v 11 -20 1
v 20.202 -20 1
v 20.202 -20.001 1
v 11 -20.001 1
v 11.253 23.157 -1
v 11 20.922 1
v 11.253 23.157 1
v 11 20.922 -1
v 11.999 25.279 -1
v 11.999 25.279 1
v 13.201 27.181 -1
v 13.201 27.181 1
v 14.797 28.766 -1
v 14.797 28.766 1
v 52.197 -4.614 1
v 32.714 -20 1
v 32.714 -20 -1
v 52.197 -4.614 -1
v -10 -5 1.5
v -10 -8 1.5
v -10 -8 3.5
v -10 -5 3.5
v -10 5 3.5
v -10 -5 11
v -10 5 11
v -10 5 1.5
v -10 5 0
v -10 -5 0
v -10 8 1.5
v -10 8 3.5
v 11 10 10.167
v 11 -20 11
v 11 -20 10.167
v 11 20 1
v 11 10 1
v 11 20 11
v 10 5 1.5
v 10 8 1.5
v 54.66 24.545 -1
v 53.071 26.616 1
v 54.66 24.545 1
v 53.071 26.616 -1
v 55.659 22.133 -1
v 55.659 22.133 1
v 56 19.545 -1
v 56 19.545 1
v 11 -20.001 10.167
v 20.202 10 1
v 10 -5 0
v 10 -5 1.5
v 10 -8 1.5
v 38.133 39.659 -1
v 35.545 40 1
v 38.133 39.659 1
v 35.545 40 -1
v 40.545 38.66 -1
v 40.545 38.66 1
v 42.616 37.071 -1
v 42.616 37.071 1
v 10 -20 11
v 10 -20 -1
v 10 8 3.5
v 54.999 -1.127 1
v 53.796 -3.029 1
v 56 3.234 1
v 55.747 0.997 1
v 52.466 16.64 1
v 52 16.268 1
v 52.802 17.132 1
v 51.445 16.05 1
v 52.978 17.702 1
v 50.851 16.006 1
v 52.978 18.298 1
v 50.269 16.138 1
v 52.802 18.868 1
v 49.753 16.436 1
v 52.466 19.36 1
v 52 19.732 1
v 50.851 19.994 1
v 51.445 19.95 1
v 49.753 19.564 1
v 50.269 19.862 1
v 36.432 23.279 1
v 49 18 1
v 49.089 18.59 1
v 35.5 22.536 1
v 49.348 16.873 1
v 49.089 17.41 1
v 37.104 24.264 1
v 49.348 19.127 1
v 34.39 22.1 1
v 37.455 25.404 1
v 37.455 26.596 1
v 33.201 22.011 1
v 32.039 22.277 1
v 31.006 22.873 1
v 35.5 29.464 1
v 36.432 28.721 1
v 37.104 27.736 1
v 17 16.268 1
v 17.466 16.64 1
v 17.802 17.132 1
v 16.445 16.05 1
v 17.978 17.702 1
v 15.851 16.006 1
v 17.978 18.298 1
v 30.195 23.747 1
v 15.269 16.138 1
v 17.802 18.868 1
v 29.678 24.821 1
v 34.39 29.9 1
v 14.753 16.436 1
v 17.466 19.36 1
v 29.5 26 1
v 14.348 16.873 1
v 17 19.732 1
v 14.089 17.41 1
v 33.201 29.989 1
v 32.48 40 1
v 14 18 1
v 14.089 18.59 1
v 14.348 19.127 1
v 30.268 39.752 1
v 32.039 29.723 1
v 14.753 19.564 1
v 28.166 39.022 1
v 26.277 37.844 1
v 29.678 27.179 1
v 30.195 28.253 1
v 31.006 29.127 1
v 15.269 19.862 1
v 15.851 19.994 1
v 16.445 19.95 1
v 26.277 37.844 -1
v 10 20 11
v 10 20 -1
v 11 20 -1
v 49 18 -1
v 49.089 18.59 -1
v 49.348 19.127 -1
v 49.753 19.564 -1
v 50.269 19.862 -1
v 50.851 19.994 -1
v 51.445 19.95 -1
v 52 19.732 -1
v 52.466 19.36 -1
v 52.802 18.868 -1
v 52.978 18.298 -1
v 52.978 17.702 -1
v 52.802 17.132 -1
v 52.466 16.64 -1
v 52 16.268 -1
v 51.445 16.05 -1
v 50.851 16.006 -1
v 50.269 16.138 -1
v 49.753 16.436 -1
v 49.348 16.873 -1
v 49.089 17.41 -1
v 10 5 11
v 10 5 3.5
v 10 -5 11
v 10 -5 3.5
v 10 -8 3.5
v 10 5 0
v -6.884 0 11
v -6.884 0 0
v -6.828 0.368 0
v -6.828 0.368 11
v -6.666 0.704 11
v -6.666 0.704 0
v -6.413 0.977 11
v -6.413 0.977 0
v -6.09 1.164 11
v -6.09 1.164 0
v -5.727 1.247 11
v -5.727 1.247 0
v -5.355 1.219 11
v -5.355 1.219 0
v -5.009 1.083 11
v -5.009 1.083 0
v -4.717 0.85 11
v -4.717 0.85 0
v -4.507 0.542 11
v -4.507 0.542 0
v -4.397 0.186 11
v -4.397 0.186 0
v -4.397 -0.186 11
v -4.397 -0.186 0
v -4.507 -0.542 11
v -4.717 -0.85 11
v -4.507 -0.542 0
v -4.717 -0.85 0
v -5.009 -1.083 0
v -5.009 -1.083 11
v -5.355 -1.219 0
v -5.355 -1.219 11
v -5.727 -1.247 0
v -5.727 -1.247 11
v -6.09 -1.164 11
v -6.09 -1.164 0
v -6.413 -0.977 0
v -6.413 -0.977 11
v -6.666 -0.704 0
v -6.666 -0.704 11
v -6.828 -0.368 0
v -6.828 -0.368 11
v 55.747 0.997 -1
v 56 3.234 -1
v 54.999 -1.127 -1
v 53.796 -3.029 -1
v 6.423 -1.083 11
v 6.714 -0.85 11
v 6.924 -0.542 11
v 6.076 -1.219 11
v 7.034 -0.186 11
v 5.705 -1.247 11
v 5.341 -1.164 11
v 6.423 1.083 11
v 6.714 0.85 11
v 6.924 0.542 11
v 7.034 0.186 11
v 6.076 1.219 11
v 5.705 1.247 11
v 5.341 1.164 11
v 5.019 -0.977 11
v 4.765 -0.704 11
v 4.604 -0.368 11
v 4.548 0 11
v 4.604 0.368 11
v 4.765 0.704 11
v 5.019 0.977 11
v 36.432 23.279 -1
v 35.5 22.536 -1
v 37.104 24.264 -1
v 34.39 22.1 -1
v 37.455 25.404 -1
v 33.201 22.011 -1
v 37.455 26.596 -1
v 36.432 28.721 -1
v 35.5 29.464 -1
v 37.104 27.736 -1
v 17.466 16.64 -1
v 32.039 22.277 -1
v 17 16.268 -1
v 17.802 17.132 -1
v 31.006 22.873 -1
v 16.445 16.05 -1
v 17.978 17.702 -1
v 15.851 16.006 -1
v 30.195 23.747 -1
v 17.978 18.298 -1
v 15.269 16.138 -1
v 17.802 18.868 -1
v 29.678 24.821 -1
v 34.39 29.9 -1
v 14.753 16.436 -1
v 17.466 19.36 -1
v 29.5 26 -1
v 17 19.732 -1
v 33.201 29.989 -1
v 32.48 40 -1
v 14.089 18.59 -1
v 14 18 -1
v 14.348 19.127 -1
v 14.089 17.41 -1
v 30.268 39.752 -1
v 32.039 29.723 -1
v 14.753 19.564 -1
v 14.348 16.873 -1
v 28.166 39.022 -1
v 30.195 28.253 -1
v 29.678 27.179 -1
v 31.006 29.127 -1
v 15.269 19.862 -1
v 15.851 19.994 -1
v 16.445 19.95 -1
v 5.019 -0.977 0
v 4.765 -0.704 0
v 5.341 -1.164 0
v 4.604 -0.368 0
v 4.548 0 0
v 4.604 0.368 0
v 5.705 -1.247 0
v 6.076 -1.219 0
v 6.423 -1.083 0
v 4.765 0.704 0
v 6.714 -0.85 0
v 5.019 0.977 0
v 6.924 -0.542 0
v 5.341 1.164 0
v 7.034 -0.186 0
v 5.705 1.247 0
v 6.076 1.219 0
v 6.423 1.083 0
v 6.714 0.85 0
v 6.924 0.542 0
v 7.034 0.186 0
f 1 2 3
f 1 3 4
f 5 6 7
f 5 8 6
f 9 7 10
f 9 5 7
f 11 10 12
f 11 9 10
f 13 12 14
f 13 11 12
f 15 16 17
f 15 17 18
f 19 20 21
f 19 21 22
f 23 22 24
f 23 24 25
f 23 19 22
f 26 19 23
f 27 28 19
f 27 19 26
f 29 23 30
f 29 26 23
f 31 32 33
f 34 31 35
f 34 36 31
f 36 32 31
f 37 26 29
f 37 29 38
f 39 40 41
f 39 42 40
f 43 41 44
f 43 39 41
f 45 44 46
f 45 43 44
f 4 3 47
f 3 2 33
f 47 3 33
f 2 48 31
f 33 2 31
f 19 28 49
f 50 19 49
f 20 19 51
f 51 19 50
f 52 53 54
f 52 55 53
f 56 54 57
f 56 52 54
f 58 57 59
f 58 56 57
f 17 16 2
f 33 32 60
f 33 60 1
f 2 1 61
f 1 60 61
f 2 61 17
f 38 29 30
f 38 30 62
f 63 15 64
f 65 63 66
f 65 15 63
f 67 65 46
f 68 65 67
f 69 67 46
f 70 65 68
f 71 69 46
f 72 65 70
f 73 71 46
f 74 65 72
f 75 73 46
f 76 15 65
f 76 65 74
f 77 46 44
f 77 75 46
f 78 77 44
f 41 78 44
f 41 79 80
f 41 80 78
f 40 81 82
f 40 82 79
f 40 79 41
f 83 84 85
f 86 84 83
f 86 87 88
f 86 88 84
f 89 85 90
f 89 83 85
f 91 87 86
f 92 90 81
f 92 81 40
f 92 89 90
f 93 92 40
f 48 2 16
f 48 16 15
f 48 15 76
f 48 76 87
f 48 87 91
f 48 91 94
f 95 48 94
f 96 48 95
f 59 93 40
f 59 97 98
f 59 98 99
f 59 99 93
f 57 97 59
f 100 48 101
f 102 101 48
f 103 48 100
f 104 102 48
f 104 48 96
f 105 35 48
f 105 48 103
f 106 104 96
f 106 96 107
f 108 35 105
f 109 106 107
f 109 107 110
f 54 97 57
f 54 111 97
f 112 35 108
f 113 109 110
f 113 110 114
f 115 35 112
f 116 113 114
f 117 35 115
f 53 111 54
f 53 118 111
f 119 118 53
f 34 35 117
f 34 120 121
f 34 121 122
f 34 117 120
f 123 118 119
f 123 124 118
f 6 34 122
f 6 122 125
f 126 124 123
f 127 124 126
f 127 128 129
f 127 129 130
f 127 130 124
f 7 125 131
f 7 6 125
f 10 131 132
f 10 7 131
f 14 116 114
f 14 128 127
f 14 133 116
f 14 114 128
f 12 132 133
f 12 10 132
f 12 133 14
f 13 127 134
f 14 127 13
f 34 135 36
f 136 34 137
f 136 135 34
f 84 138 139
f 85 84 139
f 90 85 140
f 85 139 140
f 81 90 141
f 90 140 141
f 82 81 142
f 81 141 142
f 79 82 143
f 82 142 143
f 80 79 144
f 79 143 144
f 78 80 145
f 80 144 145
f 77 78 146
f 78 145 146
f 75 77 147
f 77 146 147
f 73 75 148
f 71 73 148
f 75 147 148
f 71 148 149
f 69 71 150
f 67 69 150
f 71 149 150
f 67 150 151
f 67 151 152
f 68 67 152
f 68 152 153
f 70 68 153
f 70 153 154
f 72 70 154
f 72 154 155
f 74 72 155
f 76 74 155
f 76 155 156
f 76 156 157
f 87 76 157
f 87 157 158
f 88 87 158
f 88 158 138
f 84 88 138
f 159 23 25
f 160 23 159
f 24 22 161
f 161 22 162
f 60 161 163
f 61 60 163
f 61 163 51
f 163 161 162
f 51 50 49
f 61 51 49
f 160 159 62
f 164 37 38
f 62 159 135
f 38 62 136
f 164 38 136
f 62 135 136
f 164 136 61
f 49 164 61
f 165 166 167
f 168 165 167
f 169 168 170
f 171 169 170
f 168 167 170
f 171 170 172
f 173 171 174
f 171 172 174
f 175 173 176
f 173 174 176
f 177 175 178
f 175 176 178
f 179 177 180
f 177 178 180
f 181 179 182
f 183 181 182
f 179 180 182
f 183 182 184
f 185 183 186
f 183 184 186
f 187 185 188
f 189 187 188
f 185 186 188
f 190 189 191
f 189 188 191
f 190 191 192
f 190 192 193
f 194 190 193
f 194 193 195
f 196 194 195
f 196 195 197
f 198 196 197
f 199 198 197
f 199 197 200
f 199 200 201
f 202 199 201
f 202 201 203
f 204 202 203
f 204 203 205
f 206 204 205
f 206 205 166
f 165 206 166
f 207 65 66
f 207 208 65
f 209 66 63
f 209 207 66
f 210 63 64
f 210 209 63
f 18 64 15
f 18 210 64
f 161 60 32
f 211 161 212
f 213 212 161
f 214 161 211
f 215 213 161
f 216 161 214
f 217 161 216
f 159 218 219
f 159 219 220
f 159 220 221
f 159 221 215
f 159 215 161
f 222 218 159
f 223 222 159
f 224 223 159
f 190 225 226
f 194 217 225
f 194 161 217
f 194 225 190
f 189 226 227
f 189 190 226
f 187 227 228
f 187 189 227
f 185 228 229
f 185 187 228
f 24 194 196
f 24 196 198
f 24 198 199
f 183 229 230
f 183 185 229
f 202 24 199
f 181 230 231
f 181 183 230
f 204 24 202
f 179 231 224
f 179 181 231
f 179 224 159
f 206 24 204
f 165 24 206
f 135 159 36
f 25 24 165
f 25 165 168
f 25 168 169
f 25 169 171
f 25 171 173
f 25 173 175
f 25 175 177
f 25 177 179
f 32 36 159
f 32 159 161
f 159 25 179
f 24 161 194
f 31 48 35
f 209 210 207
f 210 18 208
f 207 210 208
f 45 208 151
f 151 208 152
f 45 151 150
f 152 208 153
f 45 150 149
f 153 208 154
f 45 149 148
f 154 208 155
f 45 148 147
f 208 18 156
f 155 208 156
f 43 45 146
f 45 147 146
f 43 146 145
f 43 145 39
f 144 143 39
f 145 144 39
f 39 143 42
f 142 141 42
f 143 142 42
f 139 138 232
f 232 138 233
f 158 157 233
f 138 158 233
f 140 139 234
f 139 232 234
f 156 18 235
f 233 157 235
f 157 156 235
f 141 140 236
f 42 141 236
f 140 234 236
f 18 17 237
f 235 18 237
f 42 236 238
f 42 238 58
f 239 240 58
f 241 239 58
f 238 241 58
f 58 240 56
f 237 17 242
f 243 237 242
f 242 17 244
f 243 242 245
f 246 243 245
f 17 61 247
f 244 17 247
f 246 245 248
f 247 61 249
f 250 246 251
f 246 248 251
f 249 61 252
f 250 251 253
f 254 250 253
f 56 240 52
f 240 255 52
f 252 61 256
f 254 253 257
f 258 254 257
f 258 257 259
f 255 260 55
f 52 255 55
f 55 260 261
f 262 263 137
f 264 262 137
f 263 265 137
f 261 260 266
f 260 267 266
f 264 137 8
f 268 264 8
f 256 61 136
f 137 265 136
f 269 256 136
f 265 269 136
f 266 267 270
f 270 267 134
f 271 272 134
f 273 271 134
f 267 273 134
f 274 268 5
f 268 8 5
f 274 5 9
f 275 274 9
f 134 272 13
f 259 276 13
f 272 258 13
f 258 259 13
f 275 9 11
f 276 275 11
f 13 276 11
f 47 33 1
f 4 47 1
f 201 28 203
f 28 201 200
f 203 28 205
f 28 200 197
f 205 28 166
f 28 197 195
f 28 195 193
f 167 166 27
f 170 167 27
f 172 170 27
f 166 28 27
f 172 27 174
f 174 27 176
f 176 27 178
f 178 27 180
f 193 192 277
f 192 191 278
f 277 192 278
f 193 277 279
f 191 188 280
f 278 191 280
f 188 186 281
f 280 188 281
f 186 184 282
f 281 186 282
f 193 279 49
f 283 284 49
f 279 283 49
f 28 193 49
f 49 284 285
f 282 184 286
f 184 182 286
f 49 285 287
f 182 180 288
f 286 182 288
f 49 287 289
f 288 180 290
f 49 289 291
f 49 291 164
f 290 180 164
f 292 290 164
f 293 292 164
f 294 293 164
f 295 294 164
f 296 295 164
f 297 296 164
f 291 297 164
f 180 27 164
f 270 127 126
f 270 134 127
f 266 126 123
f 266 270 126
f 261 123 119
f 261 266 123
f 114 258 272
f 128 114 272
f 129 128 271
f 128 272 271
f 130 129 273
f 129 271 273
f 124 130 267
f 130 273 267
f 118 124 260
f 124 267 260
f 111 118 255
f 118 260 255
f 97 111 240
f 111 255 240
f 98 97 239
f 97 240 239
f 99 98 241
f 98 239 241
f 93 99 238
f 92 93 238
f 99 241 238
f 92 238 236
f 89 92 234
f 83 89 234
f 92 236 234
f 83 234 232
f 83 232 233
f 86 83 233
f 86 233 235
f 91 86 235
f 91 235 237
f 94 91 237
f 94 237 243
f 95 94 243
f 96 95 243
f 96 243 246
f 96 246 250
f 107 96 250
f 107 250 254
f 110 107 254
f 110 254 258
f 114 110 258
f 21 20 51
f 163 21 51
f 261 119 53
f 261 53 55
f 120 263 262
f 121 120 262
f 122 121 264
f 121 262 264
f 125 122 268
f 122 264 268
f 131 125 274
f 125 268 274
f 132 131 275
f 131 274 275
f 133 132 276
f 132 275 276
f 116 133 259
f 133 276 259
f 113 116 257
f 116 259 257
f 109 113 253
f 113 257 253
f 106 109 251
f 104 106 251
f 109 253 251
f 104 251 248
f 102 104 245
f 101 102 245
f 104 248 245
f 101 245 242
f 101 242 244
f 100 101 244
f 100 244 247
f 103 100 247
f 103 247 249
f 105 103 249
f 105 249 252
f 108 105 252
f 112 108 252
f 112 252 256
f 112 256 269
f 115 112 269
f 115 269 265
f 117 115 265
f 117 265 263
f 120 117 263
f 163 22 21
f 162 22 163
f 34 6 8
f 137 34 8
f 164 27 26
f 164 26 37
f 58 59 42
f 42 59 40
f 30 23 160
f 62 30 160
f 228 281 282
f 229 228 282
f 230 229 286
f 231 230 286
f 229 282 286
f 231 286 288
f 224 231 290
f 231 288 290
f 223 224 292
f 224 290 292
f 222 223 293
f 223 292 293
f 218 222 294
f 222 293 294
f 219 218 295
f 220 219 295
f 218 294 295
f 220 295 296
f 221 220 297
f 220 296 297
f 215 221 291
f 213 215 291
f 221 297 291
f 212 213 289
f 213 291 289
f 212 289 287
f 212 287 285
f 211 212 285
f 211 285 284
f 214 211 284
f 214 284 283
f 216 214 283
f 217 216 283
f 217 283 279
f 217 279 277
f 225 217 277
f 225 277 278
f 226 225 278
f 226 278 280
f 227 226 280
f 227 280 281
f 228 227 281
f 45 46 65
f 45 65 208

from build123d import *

# Parameters (mm, degrees)
SKETCH2_W                = 20
SKETCH2_H                = 10
BOSS_EXTRUDE1_DEPTH      = 11
SKETCH3_W                = 20
SKETCH3_H                = 2
BOSS_EXTRUDE2_DEPTH      = 3
BOSS_EXTRUDE2_DEPTH_BACK = 13
SKETCH4_W                = 12
SKETCH4_H                = 40
BOSS_EXTRUDE3_DEPTH      = 1
SKETCH5_W                = 2
SKETCH5_H                = 60
BOSS_EXTRUDE4_DEPTH      = 45
F_4_0MM_DOWEL_SLOT1_D    = 4
F_8_0MM_DOWEL_SLOT4_D    = 8
SKETCH22_W               = 9.202465877
SKETCH22_H               = 9.167340884
BOSS_EXTRUDE5_DEPTH      = 0.001
BOSS_EXTRUDE5_DEPTH_BACK = 30
CUT_EXTRUDE1_DEPTH       = 31
F_2_5MM_DOWEL_SLOT1_D    = 2.5
CUT_EXTRUDE2_DEPTH       = 10
CUT_EXTRUDE3_DEPTH       = 10
FILLET1_R                = 10


with BuildPart() as part:
    # Sketch2 → Boss-Extrude1 (new body)
    with BuildSketch(Plane.XY):
        Rectangle(SKETCH2_W, SKETCH2_H)
    extrude(amount=BOSS_EXTRUDE1_DEPTH)

    # Sketch3 → Boss-Extrude2 (add, two sides)
    with BuildSketch(Plane(origin=(0, 5, 0), x_dir=(1, 0, 0), z_dir=(0, 1, 0))) as boss_extrude2_sk:
        with Locations((0, -2.5)):
            Rectangle(SKETCH3_W, SKETCH3_H)
    extrude(amount=BOSS_EXTRUDE2_DEPTH)
    extrude(boss_extrude2_sk.sketch, amount=-BOSS_EXTRUDE2_DEPTH_BACK)

    # Sketch4 → Boss-Extrude3 (add)
    with BuildSketch(Plane(origin=(10, 0, 0), x_dir=(0, 0, -1), z_dir=(1, 0, 0))):
        with Locations((-5, 0)):
            Rectangle(SKETCH4_W, SKETCH4_H)
    extrude(amount=BOSS_EXTRUDE3_DEPTH)

    # Sketch5 → Boss-Extrude4 (add)
    with BuildSketch(Plane(origin=(11, 0, 0), x_dir=(0, 0, -1), z_dir=(1, 0, 0))):
        with Locations((0, 10)):
            Rectangle(SKETCH5_W, SKETCH5_H)
    extrude(amount=BOSS_EXTRUDE4_DEPTH)

    # Ø4.0mm Dowel Slot1 (through all)
    with Locations(Plane.XY.offset(1)):
        with Locations((16, 18), (51, 18)):
            Hole(F_4_0MM_DOWEL_SLOT1_D / 2)

    # Ø8.0mm Dowel Slot4 (through all)
    with Locations(Plane.XY.offset(1)):
        with Locations((33.5, 26)):
            Hole(F_8_0MM_DOWEL_SLOT4_D / 2)

    # Sketch22 → Boss-Extrude5 (add, two sides)
    with BuildSketch(Plane(origin=(11, -20, 1), x_dir=(-1, 0, 0), z_dir=(0, -1, 0))) as boss_extrude5_sk:
        with Locations((-4.601232938, -4.583670442)):
            Rectangle(SKETCH22_W, SKETCH22_H)
    extrude(amount=BOSS_EXTRUDE5_DEPTH)
    extrude(boss_extrude5_sk.sketch, amount=-BOSS_EXTRUDE5_DEPTH_BACK)

    # Sketch23 → Cut-Extrude1 (cut)
    with BuildSketch(Plane(origin=(0, 10, 0), x_dir=(1, 0, 0), z_dir=(0, 1, 0))):
        Polygon((20.202465877, -1), (11, -10.167340884), (20.202465877, -10.167340884), align=None)
    extrude(amount=-CUT_EXTRUDE1_DEPTH, mode=Mode.SUBTRACT)

    # Ø2.5mm Dowel Slot1 (through all)
    with Locations(Plane.XY.offset(11)):
        with Locations((-5.633536512, 0), (5.798014949, 0)):
            Hole(F_2_5MM_DOWEL_SLOT1_D / 2)

    # Sketch26 → Cut-Extrude2 (cut)
    with BuildSketch(Plane.XY.offset(1)):
        Polygon((29.003862236, 40), (11, 25.763222488), (11, 40), align=None)
        Polygon((56, 40), (39.686791896, 40), (56, 23.686791896), align=None)
    extrude(amount=-CUT_EXTRUDE2_DEPTH, mode=Mode.SUBTRACT)

    # Sketch27 → Cut-Extrude3 (cut)
    with BuildSketch(Plane.XY.offset(1)):
        Polygon((32.71386297, -20), (56, -1.611523644), (56, -20), align=None)
    extrude(amount=-CUT_EXTRUDE3_DEPTH, mode=Mode.SUBTRACT)

    # Fillet1
    fillet1_edges = [part.edges().sort_by_distance(p)[0] for p in [
        (29.003862236, 40, 0),
        (11, 25.763222488, 0),
        (56, 23.686791896, 0),
        (39.686791896, 40, 0),
        (56, -1.611523644, 0),
    ]]
    fillet(fillet1_edges, radius=FILLET1_R)


solid = part.part
